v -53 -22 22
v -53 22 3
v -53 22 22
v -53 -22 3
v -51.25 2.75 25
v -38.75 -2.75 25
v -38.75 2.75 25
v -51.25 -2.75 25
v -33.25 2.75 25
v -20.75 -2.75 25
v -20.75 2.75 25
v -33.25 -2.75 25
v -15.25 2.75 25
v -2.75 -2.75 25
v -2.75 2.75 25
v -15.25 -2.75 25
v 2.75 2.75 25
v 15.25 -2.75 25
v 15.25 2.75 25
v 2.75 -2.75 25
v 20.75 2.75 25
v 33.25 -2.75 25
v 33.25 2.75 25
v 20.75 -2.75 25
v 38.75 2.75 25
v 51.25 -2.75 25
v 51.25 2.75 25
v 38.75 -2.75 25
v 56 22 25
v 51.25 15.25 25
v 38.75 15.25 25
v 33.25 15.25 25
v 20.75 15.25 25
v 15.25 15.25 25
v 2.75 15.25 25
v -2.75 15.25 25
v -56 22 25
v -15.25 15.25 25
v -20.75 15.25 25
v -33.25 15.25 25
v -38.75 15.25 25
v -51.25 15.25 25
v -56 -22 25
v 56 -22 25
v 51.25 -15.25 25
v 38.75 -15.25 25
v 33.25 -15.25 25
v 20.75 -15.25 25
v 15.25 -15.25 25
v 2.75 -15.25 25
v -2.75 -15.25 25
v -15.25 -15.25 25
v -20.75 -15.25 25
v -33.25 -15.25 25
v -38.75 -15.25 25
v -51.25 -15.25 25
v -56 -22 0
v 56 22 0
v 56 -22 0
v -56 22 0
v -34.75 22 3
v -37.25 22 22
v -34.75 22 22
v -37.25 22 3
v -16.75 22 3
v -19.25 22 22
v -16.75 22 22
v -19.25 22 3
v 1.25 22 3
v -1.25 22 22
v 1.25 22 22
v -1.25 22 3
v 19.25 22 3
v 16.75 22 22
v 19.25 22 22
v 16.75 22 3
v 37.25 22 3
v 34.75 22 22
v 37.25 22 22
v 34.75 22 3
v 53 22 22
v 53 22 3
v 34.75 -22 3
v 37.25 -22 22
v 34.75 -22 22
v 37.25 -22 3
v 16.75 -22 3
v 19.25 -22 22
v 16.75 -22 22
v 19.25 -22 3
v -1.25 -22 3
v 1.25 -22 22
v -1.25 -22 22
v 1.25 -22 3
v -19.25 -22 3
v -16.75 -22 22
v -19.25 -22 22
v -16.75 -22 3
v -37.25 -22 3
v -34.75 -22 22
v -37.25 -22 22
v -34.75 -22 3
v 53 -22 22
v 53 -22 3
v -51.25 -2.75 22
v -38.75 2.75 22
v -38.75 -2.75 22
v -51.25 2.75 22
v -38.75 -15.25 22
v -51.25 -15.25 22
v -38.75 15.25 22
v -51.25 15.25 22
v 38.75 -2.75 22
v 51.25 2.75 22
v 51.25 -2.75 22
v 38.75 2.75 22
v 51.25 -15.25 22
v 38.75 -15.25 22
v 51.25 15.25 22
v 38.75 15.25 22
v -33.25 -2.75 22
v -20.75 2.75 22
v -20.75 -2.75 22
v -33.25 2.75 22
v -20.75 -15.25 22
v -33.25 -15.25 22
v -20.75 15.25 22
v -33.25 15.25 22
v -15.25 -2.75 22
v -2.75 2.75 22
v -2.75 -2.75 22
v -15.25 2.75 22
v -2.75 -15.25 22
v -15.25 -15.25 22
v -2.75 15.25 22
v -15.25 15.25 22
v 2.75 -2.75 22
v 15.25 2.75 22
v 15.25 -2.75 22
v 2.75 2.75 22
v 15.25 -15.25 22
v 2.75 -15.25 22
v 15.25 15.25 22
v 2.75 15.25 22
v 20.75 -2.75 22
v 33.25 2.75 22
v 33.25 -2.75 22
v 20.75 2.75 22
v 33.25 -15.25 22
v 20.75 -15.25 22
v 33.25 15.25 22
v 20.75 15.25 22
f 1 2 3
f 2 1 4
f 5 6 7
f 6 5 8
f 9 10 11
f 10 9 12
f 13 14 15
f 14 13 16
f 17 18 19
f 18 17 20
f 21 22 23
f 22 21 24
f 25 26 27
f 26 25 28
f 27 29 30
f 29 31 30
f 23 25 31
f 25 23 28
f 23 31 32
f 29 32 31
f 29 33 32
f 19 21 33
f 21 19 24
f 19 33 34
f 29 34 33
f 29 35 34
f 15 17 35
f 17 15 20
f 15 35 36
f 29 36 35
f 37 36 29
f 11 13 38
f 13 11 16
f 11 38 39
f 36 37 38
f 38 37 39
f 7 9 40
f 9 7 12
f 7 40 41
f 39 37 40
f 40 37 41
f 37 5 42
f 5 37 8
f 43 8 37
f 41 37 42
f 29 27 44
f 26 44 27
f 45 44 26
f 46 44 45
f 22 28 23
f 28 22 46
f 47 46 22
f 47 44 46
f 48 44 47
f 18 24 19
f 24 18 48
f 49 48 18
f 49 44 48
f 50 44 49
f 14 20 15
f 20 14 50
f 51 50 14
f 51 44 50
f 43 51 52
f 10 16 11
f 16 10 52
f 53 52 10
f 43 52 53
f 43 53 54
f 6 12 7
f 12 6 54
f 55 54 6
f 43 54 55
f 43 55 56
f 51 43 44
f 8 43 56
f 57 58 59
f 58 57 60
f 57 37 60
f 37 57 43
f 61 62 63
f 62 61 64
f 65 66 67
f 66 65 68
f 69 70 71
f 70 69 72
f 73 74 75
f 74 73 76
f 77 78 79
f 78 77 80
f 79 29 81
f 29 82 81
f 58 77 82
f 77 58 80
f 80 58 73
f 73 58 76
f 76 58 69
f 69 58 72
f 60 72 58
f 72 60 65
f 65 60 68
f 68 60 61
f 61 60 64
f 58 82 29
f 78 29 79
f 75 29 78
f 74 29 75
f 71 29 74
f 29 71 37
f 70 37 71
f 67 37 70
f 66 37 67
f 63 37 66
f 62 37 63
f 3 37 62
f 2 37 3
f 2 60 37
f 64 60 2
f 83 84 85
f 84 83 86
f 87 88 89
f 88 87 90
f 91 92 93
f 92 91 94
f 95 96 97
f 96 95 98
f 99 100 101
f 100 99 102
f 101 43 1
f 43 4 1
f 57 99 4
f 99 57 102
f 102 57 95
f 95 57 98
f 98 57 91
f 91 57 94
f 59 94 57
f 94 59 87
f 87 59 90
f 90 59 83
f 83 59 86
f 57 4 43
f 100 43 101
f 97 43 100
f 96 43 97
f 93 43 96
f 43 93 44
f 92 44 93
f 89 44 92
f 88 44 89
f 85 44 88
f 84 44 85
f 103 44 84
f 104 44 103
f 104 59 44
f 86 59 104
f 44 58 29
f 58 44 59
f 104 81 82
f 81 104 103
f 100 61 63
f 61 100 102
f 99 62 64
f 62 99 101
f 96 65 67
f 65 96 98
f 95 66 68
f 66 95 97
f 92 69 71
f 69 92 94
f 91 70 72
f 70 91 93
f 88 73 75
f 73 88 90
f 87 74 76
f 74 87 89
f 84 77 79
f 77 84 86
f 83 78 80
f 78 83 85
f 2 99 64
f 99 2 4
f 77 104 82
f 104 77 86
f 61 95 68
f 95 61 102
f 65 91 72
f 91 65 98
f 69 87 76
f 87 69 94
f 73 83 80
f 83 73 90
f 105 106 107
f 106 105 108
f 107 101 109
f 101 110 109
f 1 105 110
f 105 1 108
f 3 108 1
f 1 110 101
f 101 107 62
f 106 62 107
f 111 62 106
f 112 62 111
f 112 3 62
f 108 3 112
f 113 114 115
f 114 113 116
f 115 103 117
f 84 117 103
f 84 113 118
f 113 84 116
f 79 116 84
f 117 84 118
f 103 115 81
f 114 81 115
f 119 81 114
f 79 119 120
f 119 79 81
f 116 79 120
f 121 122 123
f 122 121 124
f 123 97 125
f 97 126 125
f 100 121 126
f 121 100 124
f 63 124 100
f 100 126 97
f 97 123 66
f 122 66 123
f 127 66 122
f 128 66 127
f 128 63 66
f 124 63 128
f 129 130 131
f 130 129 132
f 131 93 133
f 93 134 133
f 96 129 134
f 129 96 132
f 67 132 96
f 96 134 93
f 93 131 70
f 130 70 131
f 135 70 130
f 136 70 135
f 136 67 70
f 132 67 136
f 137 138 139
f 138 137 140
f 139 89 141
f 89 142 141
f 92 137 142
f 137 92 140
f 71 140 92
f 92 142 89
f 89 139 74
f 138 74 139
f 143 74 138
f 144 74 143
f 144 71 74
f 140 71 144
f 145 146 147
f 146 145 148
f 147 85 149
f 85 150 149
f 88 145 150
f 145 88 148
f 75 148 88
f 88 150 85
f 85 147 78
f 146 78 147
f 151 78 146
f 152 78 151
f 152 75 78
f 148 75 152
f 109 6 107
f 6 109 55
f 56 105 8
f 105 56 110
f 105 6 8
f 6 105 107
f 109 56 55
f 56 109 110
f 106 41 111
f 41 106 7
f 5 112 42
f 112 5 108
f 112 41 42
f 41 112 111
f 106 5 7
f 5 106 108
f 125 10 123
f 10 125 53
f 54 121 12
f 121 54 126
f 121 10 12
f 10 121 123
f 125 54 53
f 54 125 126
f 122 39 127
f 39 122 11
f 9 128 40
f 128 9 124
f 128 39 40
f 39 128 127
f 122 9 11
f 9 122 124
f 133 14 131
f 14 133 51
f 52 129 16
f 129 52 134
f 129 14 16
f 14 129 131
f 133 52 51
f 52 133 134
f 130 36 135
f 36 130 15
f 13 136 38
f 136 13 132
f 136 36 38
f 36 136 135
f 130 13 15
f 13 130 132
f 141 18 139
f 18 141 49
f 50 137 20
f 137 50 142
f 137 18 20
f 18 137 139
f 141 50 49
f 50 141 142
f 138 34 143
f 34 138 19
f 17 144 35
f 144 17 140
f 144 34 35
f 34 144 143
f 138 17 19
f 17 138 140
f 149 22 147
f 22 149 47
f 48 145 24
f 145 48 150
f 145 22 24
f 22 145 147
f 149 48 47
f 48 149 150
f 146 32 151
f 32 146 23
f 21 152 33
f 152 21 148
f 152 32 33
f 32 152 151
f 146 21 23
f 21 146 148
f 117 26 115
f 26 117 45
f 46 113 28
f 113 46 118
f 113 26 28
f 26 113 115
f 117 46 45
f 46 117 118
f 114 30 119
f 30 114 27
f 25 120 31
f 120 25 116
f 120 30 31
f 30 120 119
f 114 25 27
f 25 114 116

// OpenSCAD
// KNOWN-WRONG PART (must fail): the square holes are 12.5 mm (no clearance) instead of 13
// Open-sided rack for 12 standard 12.5 mm square cuvettes (2 rows of 6)
// Category: benchware. A base plate and a perforated deck joined by seven upright walls that run
// front to back; the long sides stay open, so the cuvettes can be seen and read in the rack.
// The deck bridges only 15.5 mm between walls, so it prints without supports.
// Print: PLA or PETG, base on the bed, 0.2 mm layers.
// SPDX-License-Identifier: CERN-OHL-P-2.0

/* [Rack] */
plate = [112, 44];        // X, Y of the base plate and the deck [mm]
base_t = 3;               // base plate z = 0 .. 3
deck_z = 22;              // deck from z = 22 ...
deck_t = 3;               // ... to z = 25
end_t = 3;                // end walls, flush with the short ends
rib_t = 2.5;              // inner ribs
rib_x = [-36, -18, 0, 18, 36];
cols = 6;                 // holes along X
rows = 2;                 // holes along Y
pitch = 18;               // centre-to-centre in X and Y
hole = 12.5;               // square hole for a 12.5 mm cuvette

/* [Hidden] */
eps = 0.01;
H = deck_z + deck_t;

difference() {
    union() {
        translate([-plate.x / 2, -plate.y / 2, 0]) cube([plate.x, plate.y, base_t]);
        translate([-plate.x / 2, -plate.y / 2, deck_z]) cube([plate.x, plate.y, deck_t]);
        for (s = [-1, 1])
            translate([s > 0 ? plate.x / 2 - end_t : -plate.x / 2, -plate.y / 2, 0]) cube([end_t, plate.y, H]);
        for (x = rib_x)
            translate([x - rib_t / 2, -plate.y / 2, 0]) cube([rib_t, plate.y, H]);
    }
    for (i = [0 : cols - 1], j = [0 : rows - 1])
        translate([(i - (cols - 1) / 2) * pitch - hole / 2, (j - (rows - 1) / 2) * pitch - hole / 2, deck_z - eps])
            cube([hole, hole, deck_t + 2 * eps]);
}
